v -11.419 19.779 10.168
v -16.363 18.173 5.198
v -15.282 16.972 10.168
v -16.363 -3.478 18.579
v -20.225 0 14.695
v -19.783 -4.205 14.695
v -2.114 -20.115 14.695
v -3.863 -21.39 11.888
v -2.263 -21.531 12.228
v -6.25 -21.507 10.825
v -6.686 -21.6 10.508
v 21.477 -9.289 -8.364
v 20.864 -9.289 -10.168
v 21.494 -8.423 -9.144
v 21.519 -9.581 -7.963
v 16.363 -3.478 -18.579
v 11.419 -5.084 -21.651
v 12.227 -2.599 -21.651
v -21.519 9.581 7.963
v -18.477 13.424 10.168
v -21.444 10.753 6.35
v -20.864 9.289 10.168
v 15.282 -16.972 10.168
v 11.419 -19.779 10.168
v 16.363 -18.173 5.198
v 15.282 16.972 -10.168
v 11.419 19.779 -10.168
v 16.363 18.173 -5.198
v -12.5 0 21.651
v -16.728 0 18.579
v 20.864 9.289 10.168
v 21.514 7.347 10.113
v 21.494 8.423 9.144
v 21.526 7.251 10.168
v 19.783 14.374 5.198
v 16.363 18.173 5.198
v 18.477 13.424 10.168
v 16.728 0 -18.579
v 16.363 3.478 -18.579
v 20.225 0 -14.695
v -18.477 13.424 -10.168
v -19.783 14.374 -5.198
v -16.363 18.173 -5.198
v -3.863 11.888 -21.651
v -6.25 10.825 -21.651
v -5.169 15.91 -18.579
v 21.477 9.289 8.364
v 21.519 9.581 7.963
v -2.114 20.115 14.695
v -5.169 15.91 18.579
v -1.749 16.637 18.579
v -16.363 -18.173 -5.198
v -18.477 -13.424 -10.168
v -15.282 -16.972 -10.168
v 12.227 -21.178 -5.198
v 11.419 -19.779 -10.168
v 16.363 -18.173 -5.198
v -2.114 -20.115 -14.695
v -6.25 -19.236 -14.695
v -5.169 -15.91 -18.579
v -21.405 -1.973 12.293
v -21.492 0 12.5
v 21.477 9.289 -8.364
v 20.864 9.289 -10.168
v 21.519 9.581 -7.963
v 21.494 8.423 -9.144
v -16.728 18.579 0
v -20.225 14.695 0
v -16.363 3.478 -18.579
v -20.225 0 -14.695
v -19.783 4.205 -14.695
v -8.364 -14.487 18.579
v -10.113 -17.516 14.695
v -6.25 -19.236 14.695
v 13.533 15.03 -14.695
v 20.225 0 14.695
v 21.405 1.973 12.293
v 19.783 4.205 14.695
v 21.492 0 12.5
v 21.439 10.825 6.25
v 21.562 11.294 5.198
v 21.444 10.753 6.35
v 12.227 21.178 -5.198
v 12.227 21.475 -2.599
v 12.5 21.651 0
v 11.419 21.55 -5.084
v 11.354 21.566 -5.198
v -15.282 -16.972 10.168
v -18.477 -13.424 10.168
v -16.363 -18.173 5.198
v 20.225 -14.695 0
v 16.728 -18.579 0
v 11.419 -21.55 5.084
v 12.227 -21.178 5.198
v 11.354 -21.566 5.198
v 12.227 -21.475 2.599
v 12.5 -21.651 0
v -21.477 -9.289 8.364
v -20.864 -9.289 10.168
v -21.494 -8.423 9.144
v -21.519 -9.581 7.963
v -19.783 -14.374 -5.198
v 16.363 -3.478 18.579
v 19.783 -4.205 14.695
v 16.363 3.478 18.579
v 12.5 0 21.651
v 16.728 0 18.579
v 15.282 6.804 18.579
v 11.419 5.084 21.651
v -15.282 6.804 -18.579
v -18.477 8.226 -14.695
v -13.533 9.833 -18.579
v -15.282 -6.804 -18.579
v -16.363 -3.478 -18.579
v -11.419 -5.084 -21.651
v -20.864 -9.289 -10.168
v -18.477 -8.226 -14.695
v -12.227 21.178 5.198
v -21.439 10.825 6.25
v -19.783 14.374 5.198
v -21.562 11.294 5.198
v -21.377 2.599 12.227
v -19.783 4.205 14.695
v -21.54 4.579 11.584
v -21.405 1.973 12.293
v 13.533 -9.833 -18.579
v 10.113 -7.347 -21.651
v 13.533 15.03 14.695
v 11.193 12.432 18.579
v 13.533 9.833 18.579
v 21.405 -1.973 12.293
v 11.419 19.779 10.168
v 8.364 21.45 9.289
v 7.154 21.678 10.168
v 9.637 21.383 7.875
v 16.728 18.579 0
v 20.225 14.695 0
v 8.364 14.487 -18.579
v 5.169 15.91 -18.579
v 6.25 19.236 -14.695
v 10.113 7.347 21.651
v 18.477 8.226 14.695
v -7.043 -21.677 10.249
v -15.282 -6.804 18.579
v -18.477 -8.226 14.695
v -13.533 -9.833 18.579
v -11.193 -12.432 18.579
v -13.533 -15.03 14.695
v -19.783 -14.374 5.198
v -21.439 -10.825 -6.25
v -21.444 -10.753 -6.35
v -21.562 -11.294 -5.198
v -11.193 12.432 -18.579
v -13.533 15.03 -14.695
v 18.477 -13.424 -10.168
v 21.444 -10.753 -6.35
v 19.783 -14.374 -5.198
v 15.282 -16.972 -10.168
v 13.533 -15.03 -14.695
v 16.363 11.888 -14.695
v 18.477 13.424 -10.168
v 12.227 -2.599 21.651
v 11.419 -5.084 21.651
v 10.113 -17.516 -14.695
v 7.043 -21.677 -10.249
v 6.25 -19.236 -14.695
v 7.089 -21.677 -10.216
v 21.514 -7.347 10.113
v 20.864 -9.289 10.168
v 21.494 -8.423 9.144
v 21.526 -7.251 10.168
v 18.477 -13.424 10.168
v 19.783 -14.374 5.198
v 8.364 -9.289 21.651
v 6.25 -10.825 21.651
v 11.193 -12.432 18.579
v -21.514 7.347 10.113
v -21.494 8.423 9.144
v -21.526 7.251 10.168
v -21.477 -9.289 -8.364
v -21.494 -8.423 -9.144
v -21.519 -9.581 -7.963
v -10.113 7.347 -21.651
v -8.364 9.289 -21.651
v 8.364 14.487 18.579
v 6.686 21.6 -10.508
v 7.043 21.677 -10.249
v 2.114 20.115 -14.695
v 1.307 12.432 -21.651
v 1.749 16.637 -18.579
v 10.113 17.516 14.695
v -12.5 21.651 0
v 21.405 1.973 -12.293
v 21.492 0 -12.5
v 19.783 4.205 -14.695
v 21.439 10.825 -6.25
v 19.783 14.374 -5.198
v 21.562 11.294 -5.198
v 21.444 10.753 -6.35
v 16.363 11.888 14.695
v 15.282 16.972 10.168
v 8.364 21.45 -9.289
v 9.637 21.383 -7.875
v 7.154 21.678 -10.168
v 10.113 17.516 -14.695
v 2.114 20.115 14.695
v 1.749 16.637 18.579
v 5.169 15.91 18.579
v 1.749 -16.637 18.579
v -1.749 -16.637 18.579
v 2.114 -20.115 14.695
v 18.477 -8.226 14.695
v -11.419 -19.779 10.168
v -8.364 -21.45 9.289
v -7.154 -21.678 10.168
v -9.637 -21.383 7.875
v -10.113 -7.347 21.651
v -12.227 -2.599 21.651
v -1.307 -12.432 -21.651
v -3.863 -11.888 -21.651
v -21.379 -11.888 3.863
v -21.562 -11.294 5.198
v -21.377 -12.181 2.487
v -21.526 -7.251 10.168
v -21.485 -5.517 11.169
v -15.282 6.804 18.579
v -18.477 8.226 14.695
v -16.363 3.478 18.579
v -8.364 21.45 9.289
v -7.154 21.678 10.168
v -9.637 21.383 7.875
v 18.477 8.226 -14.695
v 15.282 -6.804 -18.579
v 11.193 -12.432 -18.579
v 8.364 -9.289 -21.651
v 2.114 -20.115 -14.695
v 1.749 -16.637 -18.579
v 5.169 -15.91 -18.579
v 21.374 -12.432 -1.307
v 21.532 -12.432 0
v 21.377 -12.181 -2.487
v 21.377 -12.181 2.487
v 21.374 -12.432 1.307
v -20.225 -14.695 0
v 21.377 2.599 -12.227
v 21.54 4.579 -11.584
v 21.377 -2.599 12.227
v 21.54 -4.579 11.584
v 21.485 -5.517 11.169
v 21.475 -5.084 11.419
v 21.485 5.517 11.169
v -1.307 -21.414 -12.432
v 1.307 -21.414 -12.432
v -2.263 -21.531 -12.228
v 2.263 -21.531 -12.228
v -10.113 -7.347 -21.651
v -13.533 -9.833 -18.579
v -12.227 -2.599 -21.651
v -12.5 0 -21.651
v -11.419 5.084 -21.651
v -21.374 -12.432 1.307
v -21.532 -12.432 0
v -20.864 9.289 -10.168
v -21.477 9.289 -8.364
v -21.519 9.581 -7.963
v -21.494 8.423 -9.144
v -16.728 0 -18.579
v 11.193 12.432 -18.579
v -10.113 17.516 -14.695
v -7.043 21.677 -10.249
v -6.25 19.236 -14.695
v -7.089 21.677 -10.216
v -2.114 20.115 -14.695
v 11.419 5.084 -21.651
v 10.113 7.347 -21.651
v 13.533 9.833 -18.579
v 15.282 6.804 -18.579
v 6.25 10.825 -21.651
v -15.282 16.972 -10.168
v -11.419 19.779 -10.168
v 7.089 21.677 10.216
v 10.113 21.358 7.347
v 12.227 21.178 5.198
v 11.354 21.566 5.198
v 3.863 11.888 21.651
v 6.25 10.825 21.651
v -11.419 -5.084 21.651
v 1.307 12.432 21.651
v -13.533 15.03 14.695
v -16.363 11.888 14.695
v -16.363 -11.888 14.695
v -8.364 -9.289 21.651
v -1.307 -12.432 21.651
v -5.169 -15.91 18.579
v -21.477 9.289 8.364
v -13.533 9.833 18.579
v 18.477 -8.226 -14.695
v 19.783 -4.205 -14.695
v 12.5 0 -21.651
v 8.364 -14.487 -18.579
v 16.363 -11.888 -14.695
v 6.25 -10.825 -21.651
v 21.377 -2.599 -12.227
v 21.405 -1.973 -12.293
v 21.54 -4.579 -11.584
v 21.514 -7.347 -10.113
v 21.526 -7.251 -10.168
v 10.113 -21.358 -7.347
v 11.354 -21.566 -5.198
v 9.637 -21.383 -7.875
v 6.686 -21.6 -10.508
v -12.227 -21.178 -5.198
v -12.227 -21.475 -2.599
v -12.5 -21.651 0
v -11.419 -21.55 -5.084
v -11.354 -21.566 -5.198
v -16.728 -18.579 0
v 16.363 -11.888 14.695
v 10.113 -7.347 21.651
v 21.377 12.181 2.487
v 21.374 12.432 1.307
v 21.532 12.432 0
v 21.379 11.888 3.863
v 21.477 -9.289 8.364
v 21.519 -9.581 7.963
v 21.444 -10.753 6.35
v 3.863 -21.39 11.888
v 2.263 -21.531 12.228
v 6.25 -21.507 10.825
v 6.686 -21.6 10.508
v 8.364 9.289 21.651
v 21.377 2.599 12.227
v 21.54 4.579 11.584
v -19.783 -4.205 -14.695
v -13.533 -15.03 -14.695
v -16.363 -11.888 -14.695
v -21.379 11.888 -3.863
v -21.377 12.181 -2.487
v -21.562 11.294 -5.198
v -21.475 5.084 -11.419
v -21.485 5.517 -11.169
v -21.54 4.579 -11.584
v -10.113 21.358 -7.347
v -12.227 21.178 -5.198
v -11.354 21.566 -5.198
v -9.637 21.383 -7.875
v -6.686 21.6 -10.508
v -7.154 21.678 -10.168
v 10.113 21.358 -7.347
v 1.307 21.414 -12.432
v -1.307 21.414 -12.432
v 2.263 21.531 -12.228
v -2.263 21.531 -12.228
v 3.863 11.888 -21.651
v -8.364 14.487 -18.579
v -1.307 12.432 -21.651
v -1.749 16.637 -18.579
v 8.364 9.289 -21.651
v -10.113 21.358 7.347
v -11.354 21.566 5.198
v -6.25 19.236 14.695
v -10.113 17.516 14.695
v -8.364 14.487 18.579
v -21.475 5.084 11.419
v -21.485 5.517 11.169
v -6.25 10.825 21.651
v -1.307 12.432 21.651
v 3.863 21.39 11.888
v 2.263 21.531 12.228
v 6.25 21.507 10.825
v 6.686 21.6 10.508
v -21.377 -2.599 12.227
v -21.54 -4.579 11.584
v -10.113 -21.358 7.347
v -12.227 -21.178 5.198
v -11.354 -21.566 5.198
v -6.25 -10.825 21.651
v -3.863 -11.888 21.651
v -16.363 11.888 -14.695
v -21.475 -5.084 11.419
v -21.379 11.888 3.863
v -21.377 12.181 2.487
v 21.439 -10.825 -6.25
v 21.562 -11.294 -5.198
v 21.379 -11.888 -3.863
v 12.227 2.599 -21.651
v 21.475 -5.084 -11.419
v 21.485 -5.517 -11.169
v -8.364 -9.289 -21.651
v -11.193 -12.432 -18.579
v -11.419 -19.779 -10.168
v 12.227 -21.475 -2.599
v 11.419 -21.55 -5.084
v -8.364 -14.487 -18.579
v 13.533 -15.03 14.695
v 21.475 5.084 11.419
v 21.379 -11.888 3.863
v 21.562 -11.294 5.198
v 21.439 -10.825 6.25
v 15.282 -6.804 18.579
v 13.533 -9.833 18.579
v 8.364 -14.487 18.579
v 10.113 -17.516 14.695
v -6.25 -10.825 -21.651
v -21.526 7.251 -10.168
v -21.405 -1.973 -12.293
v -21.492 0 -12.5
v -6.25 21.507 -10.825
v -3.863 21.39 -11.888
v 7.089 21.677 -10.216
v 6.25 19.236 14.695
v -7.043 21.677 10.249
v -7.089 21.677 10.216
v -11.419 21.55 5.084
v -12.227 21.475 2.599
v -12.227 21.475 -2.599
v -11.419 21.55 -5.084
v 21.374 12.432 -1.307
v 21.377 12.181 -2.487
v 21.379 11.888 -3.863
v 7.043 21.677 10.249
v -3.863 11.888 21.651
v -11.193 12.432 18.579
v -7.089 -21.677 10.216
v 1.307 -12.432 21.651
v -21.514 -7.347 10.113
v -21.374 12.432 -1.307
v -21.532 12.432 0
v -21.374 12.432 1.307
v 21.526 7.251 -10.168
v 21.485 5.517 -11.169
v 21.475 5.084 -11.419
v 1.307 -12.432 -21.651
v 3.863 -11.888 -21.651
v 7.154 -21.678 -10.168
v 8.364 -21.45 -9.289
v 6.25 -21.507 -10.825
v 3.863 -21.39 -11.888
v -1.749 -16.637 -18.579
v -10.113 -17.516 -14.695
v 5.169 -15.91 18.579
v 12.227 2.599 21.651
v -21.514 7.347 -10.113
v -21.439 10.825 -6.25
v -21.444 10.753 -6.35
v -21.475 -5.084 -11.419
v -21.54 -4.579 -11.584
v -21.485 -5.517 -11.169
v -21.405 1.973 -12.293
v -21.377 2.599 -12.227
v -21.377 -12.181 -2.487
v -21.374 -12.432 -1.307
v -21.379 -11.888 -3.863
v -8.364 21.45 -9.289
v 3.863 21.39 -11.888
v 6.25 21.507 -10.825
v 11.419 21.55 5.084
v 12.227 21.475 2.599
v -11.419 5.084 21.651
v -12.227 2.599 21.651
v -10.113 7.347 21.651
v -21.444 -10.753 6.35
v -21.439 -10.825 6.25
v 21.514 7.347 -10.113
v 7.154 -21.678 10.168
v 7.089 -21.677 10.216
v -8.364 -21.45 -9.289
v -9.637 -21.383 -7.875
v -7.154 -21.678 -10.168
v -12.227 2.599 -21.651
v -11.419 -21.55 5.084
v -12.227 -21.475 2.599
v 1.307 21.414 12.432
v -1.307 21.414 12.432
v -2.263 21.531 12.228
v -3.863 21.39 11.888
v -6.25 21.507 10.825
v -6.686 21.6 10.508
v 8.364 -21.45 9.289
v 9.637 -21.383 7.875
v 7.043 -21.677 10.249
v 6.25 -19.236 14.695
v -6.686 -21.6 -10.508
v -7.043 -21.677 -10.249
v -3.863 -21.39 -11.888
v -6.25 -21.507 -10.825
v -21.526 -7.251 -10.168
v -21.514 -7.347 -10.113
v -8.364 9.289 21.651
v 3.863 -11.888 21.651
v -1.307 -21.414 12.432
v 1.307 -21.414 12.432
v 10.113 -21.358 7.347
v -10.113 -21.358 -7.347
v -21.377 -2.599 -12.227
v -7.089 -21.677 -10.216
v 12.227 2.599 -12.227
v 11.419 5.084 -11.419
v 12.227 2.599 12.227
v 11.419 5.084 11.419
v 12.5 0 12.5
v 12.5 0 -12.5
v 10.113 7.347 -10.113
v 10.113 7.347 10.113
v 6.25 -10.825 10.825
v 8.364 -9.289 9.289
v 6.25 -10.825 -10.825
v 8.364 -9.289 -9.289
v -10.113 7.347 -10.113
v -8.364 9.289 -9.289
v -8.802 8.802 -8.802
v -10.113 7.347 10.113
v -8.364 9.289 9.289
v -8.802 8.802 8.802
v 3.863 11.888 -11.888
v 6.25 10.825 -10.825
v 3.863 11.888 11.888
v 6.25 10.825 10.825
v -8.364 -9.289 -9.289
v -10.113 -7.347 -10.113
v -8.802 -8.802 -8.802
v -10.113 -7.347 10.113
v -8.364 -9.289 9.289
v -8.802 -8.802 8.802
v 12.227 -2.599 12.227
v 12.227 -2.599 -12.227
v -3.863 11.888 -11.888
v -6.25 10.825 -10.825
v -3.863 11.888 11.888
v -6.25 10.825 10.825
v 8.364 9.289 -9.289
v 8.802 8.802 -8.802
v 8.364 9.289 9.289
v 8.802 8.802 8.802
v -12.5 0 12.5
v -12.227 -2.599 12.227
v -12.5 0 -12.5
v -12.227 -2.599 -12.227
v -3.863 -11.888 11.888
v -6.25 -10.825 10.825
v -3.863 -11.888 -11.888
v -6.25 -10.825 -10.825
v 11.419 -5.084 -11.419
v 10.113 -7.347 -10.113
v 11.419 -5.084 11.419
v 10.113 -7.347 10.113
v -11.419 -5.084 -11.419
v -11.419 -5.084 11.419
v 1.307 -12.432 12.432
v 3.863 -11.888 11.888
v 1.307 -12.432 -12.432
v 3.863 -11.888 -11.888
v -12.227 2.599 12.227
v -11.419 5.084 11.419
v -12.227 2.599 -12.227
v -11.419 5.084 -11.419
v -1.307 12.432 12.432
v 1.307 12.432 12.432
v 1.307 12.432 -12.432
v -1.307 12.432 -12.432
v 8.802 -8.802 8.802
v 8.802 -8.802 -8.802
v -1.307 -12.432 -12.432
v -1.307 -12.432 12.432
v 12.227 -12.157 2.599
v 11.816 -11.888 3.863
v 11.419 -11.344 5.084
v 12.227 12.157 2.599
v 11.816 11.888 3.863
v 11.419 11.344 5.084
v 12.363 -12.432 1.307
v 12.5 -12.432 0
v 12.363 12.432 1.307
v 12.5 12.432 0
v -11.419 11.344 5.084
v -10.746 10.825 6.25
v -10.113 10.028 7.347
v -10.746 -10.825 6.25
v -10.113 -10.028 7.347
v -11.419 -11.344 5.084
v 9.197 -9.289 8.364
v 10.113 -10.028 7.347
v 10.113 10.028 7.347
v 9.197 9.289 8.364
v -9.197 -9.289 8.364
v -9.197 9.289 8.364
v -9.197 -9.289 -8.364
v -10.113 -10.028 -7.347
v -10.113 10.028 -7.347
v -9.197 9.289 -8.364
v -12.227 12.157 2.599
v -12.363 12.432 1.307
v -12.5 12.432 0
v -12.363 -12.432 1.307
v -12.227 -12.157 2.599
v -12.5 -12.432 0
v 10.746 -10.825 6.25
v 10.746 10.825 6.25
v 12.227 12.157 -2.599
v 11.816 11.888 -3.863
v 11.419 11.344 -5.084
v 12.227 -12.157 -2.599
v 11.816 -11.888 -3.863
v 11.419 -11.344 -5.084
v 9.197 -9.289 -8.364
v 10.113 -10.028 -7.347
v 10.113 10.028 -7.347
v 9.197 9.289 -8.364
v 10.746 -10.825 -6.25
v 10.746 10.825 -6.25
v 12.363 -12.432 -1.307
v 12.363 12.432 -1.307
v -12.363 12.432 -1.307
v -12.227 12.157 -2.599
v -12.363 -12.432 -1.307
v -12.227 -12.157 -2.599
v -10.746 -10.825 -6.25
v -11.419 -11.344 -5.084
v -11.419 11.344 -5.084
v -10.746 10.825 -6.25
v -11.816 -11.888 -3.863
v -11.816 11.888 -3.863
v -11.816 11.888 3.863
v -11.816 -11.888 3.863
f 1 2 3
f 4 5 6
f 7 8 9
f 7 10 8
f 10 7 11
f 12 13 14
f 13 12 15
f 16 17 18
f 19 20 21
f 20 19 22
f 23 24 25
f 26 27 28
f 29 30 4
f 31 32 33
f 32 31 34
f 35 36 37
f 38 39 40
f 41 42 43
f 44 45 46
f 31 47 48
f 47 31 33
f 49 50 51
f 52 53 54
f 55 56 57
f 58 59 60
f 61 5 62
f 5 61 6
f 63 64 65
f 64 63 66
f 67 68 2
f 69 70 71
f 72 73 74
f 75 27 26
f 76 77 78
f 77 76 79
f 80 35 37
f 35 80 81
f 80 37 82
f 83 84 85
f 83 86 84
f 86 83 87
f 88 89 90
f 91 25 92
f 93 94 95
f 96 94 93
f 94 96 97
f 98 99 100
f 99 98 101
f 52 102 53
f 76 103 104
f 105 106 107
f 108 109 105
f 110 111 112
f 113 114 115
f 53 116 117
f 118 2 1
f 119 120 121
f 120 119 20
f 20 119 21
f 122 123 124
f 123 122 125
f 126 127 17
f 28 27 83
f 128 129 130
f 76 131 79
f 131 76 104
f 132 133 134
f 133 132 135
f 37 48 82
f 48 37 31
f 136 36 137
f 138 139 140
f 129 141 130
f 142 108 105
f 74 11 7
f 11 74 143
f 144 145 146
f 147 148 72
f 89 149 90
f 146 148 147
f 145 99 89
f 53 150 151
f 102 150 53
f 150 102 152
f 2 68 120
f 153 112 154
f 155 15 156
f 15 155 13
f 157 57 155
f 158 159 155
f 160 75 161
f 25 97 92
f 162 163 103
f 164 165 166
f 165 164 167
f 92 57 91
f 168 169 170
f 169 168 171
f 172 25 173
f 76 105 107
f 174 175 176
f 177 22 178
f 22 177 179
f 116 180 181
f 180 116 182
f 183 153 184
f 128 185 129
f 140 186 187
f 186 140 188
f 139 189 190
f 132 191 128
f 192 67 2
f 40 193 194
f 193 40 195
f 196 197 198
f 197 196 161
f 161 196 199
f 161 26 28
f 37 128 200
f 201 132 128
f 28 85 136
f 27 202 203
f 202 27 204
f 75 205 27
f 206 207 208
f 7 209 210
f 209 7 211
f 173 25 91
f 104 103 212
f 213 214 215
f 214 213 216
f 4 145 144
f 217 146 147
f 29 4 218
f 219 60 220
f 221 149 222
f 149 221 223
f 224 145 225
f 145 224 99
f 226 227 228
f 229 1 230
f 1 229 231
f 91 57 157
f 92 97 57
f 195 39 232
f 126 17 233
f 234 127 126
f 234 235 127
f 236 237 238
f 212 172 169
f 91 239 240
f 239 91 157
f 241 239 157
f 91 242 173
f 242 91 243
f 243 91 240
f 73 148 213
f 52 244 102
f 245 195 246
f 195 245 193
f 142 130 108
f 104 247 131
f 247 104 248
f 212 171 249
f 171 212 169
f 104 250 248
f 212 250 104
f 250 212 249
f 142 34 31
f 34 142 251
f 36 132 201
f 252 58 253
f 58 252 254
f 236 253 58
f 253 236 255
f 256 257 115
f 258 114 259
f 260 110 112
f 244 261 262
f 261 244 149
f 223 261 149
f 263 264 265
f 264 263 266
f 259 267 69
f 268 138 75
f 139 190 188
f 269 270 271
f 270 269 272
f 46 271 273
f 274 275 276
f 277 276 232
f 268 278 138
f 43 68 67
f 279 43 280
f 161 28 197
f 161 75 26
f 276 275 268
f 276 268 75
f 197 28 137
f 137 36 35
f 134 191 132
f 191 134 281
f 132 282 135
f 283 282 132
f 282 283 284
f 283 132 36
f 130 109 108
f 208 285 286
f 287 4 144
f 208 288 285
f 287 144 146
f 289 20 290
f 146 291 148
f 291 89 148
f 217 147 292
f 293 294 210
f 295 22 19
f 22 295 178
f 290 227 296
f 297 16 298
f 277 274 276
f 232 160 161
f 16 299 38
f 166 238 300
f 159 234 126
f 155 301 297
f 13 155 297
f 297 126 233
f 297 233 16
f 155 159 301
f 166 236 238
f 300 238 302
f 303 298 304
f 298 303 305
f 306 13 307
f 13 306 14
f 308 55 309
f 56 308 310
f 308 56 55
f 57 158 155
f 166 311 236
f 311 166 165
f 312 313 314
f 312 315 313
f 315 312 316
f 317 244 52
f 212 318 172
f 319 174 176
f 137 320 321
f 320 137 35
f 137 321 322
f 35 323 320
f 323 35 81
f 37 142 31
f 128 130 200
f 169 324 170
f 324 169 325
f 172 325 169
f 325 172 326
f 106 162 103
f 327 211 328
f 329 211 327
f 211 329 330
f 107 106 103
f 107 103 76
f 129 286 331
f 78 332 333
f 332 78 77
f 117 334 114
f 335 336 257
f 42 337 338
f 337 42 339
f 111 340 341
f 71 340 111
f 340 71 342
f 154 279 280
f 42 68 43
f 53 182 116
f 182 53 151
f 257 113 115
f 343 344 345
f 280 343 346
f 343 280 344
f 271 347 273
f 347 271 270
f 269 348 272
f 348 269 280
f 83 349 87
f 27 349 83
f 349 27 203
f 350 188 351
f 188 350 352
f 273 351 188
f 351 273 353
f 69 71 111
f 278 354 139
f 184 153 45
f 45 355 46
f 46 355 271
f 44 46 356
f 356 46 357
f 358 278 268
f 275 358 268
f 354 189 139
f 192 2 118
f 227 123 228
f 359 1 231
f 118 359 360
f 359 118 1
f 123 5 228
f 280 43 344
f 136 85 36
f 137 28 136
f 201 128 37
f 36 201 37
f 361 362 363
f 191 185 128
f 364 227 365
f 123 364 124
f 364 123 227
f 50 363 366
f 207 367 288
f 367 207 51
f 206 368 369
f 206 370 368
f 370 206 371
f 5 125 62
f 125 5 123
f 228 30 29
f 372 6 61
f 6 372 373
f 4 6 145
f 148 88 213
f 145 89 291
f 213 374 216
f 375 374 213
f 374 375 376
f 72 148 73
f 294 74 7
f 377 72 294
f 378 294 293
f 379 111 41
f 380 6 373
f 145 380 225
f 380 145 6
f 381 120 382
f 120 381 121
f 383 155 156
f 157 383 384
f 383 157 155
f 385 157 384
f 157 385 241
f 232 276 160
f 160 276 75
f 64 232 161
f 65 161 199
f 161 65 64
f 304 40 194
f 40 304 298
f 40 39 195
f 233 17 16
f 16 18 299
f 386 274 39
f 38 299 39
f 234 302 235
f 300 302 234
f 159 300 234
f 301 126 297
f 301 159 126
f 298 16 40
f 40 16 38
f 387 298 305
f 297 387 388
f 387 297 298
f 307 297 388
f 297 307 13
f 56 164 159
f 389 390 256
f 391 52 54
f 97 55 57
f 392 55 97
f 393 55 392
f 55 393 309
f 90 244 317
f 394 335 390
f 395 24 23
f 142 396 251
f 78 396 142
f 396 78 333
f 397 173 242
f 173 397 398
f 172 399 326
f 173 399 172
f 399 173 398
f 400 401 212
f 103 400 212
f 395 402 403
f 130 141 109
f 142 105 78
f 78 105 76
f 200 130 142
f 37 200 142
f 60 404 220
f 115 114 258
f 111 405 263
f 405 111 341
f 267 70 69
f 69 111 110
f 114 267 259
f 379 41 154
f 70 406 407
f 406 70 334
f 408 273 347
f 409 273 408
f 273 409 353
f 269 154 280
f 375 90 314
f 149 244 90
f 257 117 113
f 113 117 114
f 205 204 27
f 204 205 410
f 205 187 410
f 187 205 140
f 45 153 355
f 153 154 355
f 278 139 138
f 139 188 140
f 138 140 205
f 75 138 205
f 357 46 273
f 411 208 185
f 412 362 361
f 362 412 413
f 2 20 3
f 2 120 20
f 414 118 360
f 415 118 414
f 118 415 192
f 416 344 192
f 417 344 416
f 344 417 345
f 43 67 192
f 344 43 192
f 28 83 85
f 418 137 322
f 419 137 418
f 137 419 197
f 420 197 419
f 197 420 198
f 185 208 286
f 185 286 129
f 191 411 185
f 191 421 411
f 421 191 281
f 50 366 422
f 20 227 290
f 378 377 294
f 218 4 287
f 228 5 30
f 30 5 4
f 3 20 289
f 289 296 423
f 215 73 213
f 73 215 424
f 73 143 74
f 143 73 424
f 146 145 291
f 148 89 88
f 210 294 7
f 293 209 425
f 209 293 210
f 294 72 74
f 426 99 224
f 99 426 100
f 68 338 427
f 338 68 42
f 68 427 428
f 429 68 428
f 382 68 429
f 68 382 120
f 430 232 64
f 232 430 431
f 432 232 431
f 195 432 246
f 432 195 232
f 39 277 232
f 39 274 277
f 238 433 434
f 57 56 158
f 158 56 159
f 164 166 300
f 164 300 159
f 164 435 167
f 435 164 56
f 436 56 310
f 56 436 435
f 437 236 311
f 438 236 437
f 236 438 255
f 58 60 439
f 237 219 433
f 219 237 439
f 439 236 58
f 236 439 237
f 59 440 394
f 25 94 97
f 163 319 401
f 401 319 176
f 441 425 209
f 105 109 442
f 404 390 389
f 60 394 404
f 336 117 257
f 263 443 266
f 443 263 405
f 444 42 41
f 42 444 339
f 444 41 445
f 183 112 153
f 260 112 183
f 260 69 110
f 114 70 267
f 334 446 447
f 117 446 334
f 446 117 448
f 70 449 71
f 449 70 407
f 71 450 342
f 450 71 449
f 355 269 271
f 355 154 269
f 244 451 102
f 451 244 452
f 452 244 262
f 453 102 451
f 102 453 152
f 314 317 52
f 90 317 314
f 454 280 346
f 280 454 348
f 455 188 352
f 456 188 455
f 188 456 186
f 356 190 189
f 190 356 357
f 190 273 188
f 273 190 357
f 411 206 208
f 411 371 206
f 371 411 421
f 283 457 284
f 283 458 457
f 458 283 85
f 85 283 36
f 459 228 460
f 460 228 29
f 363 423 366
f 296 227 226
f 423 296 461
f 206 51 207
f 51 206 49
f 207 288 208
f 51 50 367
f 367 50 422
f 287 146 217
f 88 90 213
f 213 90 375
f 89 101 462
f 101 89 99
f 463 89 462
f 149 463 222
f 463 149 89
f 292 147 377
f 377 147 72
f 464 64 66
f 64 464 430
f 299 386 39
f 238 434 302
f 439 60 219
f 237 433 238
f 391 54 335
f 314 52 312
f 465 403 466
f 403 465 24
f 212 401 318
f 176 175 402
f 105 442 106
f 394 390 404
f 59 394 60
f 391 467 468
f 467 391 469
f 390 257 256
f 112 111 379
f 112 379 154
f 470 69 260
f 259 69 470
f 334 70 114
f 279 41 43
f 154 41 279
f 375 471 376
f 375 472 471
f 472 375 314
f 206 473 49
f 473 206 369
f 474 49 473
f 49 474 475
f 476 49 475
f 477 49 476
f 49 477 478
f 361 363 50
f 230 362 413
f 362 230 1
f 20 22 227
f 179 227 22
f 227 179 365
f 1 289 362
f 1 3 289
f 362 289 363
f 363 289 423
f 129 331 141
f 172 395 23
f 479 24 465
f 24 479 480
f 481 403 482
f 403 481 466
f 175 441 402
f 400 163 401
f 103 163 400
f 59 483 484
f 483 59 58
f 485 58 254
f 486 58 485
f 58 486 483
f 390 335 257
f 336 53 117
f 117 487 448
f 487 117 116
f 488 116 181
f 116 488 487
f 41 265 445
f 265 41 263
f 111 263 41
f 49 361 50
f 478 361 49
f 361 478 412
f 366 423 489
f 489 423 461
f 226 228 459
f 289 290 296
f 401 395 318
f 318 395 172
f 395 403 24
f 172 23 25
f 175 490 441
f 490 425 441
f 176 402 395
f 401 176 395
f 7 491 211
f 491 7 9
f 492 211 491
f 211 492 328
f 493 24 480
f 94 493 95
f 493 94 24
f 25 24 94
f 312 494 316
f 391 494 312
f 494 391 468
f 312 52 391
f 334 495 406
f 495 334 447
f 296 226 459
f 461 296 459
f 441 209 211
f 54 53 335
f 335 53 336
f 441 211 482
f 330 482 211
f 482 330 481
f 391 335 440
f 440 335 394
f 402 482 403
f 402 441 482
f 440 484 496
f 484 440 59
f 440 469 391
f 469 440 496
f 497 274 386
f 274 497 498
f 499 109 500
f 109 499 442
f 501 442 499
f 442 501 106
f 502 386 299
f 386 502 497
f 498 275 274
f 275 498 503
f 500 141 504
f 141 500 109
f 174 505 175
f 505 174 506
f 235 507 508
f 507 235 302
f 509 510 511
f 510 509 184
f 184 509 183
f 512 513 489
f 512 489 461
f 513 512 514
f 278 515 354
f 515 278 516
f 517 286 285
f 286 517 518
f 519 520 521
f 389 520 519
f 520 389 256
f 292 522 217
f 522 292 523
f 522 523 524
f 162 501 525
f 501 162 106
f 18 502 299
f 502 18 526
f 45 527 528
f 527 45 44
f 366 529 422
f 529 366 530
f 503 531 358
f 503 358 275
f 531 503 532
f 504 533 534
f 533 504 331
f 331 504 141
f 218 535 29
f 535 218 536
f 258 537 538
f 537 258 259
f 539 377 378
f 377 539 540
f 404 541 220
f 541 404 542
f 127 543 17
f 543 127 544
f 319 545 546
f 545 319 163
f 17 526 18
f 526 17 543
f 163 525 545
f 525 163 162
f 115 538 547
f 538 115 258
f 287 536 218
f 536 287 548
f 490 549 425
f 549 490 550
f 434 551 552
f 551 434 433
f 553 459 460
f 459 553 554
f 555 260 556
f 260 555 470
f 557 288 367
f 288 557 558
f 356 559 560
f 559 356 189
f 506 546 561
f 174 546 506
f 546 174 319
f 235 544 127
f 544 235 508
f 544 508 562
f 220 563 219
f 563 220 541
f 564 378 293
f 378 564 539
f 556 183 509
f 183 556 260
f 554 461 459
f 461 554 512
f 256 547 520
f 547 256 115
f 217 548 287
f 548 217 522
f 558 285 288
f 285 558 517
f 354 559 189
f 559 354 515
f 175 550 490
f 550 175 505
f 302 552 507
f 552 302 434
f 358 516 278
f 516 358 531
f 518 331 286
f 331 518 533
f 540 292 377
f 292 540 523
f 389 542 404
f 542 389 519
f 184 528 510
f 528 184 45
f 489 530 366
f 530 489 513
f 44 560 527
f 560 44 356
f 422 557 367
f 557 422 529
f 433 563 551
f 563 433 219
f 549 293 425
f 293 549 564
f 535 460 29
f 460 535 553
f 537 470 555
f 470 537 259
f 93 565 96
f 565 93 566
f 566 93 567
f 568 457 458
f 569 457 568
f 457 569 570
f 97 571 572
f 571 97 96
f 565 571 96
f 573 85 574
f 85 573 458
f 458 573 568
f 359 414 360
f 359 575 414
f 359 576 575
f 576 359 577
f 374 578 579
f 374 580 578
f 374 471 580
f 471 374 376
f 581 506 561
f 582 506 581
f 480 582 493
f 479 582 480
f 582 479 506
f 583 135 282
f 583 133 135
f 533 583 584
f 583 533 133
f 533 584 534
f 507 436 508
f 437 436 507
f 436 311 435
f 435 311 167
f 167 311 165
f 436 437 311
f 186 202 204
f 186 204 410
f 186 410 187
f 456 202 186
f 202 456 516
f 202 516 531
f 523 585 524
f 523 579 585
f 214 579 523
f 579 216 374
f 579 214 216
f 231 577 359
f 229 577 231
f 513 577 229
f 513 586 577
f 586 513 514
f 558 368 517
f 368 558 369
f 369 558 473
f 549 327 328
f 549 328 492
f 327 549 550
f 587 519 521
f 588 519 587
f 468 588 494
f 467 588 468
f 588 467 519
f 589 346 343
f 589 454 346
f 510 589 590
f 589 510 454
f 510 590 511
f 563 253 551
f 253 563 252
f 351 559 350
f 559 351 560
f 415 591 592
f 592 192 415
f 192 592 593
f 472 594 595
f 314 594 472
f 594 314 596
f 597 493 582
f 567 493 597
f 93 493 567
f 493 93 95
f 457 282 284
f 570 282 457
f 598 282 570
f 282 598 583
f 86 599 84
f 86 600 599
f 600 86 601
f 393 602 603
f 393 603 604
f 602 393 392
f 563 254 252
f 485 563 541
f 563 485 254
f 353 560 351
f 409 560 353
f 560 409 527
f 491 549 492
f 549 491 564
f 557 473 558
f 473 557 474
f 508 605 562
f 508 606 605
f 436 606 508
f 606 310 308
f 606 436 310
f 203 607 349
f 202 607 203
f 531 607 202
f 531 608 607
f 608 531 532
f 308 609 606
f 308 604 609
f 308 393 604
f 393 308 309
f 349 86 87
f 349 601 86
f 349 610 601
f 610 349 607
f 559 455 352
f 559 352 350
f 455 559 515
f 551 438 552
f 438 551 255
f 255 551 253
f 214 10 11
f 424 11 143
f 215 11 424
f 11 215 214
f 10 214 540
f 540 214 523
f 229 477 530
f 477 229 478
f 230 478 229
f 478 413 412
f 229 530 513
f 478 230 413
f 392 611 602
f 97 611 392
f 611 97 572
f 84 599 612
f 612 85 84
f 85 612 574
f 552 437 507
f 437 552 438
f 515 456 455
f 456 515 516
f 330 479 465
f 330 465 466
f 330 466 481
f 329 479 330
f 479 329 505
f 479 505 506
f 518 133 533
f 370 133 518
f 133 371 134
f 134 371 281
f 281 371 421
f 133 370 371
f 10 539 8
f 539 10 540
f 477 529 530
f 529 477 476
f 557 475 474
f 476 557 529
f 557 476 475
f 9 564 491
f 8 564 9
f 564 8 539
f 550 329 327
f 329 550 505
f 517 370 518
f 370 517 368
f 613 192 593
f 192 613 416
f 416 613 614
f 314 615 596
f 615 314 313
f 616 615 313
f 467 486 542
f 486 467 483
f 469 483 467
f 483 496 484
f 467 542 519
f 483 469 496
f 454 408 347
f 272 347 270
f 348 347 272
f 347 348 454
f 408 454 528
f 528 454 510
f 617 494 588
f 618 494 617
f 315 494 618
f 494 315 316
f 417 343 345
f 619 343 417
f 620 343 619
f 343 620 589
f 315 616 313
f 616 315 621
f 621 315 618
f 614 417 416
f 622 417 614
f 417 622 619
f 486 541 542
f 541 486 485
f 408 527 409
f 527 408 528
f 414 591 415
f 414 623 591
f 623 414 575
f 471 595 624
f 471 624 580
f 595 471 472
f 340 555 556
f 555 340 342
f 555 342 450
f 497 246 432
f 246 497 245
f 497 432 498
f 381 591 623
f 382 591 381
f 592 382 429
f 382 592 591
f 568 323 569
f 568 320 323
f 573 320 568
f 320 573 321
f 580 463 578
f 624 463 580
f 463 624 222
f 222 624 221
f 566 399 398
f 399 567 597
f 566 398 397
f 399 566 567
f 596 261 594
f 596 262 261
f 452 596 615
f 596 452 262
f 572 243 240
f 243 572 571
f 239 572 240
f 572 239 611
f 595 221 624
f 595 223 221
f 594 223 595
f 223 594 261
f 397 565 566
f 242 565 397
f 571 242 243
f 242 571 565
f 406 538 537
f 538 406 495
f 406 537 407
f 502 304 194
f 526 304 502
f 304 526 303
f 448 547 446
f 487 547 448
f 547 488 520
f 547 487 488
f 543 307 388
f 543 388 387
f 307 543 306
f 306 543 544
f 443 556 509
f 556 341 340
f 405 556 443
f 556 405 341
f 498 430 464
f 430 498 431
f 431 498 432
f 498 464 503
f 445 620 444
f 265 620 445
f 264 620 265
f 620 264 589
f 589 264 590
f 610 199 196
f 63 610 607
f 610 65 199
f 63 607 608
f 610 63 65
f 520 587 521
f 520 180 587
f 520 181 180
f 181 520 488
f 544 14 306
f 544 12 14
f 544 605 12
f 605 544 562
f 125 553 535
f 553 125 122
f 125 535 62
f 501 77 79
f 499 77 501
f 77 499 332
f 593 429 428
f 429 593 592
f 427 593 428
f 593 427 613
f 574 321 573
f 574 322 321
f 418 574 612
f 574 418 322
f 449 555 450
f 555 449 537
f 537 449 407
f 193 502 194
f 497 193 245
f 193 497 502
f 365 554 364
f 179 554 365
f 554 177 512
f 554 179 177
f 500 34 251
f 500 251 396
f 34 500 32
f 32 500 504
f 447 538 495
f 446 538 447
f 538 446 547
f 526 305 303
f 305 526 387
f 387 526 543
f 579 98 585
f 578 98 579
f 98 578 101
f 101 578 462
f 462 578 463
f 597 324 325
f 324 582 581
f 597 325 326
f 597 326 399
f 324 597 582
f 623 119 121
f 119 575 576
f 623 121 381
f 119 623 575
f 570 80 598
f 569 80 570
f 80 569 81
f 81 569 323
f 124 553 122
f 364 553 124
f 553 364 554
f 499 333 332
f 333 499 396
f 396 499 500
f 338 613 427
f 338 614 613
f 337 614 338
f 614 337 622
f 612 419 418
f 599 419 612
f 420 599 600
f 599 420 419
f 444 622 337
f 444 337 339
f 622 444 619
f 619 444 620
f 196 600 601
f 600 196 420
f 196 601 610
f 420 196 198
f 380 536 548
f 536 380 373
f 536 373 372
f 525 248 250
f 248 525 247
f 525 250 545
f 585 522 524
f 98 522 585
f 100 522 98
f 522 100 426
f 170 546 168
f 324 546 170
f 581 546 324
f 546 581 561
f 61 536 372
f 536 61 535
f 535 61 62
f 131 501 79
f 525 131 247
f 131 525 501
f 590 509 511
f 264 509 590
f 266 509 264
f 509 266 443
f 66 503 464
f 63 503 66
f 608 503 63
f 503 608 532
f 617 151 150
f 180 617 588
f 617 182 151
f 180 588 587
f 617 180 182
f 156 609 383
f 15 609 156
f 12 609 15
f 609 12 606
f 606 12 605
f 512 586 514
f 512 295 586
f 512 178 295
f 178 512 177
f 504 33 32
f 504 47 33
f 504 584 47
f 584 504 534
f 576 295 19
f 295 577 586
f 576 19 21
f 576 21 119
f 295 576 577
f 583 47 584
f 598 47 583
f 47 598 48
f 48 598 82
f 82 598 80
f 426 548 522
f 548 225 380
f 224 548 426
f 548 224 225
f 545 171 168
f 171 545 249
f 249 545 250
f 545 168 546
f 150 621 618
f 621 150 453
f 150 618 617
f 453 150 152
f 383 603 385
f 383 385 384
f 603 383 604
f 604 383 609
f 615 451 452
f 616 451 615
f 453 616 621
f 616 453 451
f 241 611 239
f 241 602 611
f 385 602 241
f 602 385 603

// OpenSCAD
/*
 *  OpenSCAD (www.openscad.org)
 *  Copyright (C) 2009-2011 Clifford Wolf <clifford@clifford.at> and
 *                          Marius Kintel <marius@kintel.net>
 *
 *  This program is free software; you can redistribute it and/or modify
 *  it under the terms of the GNU General Public License as published by
 *  the Free Software Foundation; either version 2 of the License, or
 *  (at your option) any later version.
 *
 *  This program is distributed in the hope that it will be useful,
 *  but WITHOUT ANY WARRANTY; without even the implied warranty of
 *  MERCHANTABILITY or FITNESS FOR A PARTICULAR PURPOSE.  See the
 *  GNU General Public License for more details.
 *
 *  You should have received a copy of the GNU General Public License
 *  along with this program; if not, write to the Free Software
 *  Foundation, Inc., 59 Temple Place, Suite 330, Boston, MA  02111-1307  USA
 *
 */

module example001()
{
	function r_from_dia(d) = d / 2;

	module rotcy(rot, r, h) {
		rotate(90, rot)
			cylinder(r = r, h = h, center = true);
	}

	difference() {
		sphere(r = r_from_dia(size));
		rotcy([0, 0, 0], cy_r, cy_h);
		rotcy([1, 0, 0], cy_r, cy_h);
		rotcy([0, 1, 0], cy_r, cy_h);
	}

	size = 50;
	hole = 25;

	cy_r = r_from_dia(hole);
	cy_h = r_from_dia(size * 2.5);
}

example001();
